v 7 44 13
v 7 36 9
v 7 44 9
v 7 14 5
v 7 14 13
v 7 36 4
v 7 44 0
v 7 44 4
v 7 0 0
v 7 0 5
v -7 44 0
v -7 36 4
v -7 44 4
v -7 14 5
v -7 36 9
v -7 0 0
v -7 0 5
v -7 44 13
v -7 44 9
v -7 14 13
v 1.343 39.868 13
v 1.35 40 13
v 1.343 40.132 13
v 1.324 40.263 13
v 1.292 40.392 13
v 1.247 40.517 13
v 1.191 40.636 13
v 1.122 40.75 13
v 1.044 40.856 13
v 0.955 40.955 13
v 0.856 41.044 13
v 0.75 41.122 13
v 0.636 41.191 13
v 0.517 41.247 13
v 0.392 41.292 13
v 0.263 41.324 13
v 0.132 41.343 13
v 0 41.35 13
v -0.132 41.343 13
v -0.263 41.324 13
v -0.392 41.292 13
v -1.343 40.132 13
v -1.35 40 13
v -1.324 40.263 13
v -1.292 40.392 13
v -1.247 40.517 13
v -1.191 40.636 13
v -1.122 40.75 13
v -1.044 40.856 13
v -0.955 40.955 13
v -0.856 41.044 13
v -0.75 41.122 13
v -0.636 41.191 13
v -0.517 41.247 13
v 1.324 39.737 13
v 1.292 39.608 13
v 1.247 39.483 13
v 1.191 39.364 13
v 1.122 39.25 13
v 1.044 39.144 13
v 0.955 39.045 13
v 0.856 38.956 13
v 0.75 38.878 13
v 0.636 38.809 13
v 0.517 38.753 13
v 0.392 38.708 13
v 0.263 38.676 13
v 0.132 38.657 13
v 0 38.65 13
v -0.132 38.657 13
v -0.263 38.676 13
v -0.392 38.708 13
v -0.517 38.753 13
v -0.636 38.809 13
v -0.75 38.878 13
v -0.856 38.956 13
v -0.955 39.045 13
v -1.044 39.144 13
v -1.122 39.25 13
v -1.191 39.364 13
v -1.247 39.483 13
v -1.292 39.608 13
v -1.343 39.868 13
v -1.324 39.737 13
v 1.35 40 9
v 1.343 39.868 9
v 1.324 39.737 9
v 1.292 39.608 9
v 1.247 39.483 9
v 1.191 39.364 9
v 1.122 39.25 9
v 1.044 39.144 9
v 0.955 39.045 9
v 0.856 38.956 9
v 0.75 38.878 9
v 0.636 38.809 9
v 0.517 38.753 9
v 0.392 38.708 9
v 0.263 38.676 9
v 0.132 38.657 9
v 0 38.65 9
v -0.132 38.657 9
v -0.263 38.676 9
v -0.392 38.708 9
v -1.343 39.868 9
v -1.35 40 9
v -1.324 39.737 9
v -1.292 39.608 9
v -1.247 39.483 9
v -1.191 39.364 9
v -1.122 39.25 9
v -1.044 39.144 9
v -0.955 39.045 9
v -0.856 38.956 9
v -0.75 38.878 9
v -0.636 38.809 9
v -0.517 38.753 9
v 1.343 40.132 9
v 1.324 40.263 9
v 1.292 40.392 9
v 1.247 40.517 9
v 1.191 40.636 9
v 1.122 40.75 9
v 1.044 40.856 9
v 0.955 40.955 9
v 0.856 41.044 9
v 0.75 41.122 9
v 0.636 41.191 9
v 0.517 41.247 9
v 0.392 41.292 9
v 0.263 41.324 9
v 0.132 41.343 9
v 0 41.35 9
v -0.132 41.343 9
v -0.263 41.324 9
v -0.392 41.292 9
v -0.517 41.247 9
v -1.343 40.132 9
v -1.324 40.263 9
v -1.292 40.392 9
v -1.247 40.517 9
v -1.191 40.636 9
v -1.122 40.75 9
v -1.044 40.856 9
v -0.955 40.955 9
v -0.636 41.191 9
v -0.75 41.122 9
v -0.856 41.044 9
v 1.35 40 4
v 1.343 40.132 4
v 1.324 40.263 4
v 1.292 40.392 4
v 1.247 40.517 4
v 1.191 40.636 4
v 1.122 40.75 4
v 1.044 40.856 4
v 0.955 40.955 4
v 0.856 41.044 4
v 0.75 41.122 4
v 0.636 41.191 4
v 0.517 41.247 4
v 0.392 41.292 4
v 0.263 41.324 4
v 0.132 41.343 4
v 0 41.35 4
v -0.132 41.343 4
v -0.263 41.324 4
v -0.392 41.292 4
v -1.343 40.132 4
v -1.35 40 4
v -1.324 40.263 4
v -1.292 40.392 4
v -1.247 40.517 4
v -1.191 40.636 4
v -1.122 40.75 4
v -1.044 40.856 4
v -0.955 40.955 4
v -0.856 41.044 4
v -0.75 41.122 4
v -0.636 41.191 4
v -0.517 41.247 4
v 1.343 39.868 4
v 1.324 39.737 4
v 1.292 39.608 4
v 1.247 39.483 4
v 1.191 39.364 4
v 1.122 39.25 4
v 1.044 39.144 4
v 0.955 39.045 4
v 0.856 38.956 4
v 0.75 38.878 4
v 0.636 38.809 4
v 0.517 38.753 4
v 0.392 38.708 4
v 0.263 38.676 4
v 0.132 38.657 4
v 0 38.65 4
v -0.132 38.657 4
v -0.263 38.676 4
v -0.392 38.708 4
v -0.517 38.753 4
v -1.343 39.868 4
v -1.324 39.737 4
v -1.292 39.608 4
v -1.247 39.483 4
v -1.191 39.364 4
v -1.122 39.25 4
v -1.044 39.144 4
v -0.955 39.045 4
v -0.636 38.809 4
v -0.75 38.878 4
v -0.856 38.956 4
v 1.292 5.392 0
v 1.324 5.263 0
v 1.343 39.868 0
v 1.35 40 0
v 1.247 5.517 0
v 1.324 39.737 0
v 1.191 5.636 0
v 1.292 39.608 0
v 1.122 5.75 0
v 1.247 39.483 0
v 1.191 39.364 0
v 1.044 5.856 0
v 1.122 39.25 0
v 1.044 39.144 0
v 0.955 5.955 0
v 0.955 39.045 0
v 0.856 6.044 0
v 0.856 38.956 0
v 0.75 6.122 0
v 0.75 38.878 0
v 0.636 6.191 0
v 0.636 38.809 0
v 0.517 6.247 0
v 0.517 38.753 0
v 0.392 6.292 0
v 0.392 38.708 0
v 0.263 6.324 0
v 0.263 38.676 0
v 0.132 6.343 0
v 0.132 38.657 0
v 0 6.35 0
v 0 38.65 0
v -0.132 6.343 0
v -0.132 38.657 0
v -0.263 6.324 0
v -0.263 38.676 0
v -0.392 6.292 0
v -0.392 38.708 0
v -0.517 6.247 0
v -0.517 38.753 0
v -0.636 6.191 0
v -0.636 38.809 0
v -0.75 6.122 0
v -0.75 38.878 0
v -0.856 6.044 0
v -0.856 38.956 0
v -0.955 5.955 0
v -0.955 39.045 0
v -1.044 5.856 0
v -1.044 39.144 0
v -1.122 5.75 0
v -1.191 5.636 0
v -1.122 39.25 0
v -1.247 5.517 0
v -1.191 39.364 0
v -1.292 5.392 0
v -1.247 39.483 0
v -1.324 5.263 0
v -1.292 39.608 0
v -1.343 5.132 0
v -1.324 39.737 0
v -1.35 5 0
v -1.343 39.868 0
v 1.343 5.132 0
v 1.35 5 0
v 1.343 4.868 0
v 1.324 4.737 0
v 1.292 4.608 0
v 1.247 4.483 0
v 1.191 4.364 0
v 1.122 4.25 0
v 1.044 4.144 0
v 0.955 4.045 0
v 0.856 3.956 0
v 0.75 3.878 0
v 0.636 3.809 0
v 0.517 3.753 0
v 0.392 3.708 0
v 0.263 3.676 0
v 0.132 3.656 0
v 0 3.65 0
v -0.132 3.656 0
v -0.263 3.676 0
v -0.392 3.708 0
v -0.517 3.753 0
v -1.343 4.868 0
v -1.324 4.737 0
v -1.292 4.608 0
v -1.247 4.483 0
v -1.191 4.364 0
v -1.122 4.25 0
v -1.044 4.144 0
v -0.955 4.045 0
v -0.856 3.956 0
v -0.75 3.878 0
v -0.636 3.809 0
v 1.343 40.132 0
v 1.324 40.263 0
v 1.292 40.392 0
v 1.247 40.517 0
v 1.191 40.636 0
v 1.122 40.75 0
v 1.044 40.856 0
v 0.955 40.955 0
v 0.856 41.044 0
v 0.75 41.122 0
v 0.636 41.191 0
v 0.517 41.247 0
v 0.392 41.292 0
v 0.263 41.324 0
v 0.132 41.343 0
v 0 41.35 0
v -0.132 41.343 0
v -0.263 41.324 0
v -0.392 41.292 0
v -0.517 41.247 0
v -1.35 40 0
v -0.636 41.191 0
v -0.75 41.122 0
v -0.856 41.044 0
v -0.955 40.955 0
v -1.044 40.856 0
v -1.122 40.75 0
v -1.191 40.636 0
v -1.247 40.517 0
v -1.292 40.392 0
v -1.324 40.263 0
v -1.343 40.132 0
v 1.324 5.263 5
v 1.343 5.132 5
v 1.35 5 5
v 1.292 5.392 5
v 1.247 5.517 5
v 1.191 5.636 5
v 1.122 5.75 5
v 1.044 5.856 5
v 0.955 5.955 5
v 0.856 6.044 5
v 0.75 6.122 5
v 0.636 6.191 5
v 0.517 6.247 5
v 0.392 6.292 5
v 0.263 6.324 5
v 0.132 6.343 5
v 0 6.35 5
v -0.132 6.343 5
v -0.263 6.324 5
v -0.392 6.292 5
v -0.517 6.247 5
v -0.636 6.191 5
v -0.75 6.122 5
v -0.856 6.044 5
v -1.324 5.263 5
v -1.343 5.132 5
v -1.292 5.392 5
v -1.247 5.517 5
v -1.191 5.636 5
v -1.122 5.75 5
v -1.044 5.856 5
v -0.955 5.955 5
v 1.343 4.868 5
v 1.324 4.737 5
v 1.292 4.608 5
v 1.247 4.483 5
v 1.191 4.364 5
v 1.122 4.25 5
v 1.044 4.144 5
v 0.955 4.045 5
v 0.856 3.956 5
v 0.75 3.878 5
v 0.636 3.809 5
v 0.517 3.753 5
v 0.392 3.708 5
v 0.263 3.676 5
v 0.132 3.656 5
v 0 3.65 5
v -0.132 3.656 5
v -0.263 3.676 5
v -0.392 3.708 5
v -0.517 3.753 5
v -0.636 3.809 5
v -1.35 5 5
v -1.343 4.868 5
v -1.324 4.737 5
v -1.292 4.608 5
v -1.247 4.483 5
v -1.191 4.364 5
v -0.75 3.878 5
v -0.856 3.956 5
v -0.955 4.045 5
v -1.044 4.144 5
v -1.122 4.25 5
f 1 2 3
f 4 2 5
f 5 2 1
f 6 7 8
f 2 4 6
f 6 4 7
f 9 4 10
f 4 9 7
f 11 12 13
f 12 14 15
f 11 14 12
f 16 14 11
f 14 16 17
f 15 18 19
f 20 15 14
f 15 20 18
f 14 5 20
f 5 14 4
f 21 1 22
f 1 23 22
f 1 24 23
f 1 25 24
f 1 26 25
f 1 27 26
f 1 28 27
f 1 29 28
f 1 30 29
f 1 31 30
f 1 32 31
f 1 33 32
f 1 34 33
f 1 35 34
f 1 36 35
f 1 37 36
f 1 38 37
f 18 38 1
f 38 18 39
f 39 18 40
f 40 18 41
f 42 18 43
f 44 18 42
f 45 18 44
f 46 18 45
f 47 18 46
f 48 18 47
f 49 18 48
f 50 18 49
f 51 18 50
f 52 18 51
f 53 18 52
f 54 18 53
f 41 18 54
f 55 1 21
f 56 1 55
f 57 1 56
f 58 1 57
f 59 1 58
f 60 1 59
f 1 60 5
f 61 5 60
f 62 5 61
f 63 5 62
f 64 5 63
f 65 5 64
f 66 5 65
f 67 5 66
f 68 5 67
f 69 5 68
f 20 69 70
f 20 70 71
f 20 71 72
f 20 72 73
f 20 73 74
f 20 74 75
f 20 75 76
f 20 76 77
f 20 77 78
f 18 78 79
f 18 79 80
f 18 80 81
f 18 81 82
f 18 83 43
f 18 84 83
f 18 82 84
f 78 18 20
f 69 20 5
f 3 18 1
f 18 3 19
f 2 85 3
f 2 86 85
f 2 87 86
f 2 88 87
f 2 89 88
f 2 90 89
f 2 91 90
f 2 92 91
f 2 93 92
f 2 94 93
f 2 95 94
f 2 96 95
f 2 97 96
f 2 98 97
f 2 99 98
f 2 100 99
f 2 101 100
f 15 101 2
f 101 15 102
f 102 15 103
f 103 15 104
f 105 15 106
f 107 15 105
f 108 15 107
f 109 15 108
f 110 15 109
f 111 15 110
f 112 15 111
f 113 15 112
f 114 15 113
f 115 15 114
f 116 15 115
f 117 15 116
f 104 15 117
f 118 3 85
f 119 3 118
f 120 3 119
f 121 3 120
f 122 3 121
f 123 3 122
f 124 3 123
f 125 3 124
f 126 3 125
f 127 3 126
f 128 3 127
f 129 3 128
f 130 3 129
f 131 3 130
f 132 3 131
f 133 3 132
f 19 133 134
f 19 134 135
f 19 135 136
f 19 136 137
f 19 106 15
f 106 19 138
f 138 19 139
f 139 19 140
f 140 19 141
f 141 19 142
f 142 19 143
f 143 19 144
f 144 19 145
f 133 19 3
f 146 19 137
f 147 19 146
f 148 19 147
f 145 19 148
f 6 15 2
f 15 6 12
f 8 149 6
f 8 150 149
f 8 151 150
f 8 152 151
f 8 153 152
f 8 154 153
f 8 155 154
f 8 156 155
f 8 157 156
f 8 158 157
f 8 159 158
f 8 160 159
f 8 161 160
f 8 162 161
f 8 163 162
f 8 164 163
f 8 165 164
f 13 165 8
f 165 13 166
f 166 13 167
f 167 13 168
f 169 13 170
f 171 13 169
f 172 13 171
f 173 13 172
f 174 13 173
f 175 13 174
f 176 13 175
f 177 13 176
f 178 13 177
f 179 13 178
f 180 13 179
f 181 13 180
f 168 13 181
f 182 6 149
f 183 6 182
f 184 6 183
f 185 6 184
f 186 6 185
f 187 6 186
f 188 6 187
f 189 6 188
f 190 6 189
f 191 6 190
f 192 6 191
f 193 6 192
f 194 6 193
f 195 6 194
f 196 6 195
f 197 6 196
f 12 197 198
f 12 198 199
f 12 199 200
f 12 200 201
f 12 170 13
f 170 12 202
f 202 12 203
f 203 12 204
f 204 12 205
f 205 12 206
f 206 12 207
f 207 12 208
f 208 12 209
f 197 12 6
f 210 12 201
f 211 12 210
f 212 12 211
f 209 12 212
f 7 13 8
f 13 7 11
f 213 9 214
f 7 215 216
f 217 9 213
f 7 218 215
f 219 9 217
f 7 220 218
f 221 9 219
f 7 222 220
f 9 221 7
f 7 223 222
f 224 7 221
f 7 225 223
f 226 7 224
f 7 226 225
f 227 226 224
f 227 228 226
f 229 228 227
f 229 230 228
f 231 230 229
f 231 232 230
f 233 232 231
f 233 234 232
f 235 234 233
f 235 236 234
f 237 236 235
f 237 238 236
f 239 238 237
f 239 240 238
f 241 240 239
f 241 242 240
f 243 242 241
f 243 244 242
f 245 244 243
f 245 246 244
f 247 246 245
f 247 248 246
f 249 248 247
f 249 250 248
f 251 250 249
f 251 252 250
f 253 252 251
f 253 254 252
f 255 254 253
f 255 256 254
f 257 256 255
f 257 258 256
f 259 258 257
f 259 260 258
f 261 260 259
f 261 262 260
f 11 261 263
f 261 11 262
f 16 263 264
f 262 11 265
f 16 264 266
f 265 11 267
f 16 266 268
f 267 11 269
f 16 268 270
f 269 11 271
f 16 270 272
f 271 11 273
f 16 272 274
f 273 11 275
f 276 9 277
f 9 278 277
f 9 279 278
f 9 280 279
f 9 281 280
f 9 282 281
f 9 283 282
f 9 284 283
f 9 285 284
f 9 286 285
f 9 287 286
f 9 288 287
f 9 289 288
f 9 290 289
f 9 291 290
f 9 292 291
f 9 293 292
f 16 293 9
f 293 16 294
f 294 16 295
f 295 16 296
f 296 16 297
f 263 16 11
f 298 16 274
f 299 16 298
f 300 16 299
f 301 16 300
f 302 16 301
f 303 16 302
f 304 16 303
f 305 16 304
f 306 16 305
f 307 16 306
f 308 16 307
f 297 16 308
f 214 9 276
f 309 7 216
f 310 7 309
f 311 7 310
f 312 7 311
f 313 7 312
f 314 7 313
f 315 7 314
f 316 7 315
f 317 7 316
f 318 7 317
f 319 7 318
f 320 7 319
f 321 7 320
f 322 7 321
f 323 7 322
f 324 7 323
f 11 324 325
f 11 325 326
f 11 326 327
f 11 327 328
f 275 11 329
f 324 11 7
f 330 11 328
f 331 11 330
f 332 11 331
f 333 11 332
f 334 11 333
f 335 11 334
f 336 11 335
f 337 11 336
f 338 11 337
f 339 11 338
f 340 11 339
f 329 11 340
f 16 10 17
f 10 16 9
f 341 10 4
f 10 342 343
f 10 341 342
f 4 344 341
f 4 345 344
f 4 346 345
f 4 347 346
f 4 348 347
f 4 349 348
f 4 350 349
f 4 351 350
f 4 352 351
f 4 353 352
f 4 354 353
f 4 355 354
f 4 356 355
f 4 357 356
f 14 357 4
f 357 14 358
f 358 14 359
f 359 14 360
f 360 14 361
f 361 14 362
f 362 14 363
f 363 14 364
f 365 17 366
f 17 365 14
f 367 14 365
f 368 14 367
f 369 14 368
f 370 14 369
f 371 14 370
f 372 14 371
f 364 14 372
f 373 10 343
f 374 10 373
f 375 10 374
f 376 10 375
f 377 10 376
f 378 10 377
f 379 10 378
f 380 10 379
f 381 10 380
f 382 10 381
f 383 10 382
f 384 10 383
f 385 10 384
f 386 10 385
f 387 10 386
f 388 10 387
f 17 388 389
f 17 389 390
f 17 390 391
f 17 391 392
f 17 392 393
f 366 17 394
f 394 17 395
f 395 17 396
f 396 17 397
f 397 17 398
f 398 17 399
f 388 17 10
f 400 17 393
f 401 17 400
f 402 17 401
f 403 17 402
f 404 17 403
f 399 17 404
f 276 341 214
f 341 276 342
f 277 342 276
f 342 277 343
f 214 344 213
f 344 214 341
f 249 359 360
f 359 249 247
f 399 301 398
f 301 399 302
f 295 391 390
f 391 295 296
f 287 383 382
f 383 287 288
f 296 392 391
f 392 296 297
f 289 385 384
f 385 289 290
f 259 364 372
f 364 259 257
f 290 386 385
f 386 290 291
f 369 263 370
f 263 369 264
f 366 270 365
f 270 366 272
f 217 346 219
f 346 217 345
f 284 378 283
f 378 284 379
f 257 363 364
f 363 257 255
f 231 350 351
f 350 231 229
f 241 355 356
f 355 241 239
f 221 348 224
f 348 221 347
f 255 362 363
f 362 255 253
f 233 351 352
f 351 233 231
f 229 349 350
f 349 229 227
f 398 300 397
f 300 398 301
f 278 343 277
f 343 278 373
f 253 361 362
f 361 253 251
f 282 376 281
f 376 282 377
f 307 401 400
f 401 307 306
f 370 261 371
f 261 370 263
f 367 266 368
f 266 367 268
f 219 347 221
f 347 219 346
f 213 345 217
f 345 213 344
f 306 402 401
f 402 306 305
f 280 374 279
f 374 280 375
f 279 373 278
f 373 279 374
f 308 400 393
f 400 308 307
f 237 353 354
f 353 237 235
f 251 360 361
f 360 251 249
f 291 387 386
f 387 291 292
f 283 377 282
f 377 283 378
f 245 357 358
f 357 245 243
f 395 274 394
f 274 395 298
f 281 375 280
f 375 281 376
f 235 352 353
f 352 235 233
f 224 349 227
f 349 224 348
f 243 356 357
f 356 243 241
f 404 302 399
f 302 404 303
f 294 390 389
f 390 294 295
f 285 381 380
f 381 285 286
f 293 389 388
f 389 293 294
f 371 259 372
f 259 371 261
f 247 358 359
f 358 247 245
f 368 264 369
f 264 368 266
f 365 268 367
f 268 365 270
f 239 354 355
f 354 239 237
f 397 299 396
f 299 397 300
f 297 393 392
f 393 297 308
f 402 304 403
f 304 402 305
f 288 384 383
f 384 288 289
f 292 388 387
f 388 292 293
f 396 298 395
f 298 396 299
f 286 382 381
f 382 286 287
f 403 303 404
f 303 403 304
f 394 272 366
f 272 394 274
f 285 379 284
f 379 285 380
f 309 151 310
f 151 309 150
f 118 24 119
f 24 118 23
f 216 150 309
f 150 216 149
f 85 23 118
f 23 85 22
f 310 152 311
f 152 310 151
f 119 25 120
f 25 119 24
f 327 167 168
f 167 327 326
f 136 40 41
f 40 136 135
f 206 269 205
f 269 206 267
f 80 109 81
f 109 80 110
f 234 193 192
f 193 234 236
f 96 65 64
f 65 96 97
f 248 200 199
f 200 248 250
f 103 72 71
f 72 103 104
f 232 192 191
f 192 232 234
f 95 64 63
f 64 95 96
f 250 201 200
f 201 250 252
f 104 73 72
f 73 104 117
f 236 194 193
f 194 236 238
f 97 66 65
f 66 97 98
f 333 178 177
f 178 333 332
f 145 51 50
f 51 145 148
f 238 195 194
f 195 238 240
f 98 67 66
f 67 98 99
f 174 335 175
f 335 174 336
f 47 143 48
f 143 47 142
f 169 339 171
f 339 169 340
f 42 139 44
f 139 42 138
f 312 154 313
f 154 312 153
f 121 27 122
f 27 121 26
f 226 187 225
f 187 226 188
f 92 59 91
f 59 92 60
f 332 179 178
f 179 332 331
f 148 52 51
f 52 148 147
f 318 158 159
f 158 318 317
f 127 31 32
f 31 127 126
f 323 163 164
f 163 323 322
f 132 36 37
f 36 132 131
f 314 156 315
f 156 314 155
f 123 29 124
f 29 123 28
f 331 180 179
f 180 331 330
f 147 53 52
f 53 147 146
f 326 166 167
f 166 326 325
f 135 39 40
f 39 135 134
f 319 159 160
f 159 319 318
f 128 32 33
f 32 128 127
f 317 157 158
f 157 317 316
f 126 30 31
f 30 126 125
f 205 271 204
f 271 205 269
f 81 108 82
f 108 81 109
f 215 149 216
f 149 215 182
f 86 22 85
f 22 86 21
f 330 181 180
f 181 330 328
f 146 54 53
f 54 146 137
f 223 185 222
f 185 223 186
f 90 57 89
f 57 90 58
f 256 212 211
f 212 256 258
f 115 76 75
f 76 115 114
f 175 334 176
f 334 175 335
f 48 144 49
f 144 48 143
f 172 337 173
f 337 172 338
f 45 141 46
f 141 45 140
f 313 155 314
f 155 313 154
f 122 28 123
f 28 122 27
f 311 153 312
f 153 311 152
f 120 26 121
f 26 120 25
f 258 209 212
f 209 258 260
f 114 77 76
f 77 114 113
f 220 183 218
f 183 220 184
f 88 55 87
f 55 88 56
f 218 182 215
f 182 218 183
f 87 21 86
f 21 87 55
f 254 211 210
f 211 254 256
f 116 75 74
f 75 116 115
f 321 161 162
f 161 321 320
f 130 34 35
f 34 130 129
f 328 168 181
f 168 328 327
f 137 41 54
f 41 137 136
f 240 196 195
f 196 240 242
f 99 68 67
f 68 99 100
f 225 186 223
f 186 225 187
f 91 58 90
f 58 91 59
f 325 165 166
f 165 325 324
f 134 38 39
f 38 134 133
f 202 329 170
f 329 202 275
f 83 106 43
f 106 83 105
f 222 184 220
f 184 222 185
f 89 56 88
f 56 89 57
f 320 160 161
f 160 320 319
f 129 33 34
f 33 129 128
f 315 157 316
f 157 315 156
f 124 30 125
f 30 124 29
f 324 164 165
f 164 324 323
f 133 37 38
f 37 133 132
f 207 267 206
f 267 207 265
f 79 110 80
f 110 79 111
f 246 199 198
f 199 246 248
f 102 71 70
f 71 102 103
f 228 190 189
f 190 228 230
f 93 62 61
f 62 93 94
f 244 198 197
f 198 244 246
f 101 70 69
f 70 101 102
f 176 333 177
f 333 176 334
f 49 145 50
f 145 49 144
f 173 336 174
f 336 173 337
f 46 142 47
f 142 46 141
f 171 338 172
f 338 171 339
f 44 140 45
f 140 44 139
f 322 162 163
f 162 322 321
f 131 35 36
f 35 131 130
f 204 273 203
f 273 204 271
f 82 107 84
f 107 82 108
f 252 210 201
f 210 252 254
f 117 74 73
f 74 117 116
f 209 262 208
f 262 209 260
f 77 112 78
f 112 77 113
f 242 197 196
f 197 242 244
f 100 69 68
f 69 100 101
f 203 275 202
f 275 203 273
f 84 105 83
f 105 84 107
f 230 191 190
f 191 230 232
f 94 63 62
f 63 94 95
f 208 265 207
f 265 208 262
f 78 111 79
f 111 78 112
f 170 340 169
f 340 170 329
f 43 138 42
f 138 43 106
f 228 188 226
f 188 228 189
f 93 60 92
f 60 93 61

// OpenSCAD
/*

 __  __
|-| |-|
|-|_|-|
|     |
|     |
|     |
|     |
|  ___|
|-| 
|-|
|_|

*/

screw_d=2.7;
under_screw=9;
under_screw_gap=5;
printer_x=8;
holder_x=5;
holder_y=8;
distance=30;
z=14;

res=64;

max_y=under_screw_gap+under_screw+distance;
max_x=holder_x+printer_x;

difference(){
  translate([z/2,0,0])
  rotate([0,-90,0])
  linear_extrude(z)
  polygon(points=[
    [0,0],
    [0,max_y],
    [max_x/2-(holder_x/2),max_y],
    [max_x/2-(holder_x/2),max_y-holder_y],
    [max_x/2+(holder_x/2),max_y-holder_y],
    [max_x/2+(holder_x/2),max_y],
    [max_x,max_y],
    [max_x,under_screw_gap+under_screw],
    [max_x-printer_x,under_screw_gap+under_screw],
    [max_x-printer_x,0],
  ]);
  translate([0,under_screw_gap,0])
  cylinder(d=screw_d, h=z, $fn=res);

  translate([0,max_y-holder_y/2,0])
  cylinder(d=screw_d, h=z, $fn=res);
  }
